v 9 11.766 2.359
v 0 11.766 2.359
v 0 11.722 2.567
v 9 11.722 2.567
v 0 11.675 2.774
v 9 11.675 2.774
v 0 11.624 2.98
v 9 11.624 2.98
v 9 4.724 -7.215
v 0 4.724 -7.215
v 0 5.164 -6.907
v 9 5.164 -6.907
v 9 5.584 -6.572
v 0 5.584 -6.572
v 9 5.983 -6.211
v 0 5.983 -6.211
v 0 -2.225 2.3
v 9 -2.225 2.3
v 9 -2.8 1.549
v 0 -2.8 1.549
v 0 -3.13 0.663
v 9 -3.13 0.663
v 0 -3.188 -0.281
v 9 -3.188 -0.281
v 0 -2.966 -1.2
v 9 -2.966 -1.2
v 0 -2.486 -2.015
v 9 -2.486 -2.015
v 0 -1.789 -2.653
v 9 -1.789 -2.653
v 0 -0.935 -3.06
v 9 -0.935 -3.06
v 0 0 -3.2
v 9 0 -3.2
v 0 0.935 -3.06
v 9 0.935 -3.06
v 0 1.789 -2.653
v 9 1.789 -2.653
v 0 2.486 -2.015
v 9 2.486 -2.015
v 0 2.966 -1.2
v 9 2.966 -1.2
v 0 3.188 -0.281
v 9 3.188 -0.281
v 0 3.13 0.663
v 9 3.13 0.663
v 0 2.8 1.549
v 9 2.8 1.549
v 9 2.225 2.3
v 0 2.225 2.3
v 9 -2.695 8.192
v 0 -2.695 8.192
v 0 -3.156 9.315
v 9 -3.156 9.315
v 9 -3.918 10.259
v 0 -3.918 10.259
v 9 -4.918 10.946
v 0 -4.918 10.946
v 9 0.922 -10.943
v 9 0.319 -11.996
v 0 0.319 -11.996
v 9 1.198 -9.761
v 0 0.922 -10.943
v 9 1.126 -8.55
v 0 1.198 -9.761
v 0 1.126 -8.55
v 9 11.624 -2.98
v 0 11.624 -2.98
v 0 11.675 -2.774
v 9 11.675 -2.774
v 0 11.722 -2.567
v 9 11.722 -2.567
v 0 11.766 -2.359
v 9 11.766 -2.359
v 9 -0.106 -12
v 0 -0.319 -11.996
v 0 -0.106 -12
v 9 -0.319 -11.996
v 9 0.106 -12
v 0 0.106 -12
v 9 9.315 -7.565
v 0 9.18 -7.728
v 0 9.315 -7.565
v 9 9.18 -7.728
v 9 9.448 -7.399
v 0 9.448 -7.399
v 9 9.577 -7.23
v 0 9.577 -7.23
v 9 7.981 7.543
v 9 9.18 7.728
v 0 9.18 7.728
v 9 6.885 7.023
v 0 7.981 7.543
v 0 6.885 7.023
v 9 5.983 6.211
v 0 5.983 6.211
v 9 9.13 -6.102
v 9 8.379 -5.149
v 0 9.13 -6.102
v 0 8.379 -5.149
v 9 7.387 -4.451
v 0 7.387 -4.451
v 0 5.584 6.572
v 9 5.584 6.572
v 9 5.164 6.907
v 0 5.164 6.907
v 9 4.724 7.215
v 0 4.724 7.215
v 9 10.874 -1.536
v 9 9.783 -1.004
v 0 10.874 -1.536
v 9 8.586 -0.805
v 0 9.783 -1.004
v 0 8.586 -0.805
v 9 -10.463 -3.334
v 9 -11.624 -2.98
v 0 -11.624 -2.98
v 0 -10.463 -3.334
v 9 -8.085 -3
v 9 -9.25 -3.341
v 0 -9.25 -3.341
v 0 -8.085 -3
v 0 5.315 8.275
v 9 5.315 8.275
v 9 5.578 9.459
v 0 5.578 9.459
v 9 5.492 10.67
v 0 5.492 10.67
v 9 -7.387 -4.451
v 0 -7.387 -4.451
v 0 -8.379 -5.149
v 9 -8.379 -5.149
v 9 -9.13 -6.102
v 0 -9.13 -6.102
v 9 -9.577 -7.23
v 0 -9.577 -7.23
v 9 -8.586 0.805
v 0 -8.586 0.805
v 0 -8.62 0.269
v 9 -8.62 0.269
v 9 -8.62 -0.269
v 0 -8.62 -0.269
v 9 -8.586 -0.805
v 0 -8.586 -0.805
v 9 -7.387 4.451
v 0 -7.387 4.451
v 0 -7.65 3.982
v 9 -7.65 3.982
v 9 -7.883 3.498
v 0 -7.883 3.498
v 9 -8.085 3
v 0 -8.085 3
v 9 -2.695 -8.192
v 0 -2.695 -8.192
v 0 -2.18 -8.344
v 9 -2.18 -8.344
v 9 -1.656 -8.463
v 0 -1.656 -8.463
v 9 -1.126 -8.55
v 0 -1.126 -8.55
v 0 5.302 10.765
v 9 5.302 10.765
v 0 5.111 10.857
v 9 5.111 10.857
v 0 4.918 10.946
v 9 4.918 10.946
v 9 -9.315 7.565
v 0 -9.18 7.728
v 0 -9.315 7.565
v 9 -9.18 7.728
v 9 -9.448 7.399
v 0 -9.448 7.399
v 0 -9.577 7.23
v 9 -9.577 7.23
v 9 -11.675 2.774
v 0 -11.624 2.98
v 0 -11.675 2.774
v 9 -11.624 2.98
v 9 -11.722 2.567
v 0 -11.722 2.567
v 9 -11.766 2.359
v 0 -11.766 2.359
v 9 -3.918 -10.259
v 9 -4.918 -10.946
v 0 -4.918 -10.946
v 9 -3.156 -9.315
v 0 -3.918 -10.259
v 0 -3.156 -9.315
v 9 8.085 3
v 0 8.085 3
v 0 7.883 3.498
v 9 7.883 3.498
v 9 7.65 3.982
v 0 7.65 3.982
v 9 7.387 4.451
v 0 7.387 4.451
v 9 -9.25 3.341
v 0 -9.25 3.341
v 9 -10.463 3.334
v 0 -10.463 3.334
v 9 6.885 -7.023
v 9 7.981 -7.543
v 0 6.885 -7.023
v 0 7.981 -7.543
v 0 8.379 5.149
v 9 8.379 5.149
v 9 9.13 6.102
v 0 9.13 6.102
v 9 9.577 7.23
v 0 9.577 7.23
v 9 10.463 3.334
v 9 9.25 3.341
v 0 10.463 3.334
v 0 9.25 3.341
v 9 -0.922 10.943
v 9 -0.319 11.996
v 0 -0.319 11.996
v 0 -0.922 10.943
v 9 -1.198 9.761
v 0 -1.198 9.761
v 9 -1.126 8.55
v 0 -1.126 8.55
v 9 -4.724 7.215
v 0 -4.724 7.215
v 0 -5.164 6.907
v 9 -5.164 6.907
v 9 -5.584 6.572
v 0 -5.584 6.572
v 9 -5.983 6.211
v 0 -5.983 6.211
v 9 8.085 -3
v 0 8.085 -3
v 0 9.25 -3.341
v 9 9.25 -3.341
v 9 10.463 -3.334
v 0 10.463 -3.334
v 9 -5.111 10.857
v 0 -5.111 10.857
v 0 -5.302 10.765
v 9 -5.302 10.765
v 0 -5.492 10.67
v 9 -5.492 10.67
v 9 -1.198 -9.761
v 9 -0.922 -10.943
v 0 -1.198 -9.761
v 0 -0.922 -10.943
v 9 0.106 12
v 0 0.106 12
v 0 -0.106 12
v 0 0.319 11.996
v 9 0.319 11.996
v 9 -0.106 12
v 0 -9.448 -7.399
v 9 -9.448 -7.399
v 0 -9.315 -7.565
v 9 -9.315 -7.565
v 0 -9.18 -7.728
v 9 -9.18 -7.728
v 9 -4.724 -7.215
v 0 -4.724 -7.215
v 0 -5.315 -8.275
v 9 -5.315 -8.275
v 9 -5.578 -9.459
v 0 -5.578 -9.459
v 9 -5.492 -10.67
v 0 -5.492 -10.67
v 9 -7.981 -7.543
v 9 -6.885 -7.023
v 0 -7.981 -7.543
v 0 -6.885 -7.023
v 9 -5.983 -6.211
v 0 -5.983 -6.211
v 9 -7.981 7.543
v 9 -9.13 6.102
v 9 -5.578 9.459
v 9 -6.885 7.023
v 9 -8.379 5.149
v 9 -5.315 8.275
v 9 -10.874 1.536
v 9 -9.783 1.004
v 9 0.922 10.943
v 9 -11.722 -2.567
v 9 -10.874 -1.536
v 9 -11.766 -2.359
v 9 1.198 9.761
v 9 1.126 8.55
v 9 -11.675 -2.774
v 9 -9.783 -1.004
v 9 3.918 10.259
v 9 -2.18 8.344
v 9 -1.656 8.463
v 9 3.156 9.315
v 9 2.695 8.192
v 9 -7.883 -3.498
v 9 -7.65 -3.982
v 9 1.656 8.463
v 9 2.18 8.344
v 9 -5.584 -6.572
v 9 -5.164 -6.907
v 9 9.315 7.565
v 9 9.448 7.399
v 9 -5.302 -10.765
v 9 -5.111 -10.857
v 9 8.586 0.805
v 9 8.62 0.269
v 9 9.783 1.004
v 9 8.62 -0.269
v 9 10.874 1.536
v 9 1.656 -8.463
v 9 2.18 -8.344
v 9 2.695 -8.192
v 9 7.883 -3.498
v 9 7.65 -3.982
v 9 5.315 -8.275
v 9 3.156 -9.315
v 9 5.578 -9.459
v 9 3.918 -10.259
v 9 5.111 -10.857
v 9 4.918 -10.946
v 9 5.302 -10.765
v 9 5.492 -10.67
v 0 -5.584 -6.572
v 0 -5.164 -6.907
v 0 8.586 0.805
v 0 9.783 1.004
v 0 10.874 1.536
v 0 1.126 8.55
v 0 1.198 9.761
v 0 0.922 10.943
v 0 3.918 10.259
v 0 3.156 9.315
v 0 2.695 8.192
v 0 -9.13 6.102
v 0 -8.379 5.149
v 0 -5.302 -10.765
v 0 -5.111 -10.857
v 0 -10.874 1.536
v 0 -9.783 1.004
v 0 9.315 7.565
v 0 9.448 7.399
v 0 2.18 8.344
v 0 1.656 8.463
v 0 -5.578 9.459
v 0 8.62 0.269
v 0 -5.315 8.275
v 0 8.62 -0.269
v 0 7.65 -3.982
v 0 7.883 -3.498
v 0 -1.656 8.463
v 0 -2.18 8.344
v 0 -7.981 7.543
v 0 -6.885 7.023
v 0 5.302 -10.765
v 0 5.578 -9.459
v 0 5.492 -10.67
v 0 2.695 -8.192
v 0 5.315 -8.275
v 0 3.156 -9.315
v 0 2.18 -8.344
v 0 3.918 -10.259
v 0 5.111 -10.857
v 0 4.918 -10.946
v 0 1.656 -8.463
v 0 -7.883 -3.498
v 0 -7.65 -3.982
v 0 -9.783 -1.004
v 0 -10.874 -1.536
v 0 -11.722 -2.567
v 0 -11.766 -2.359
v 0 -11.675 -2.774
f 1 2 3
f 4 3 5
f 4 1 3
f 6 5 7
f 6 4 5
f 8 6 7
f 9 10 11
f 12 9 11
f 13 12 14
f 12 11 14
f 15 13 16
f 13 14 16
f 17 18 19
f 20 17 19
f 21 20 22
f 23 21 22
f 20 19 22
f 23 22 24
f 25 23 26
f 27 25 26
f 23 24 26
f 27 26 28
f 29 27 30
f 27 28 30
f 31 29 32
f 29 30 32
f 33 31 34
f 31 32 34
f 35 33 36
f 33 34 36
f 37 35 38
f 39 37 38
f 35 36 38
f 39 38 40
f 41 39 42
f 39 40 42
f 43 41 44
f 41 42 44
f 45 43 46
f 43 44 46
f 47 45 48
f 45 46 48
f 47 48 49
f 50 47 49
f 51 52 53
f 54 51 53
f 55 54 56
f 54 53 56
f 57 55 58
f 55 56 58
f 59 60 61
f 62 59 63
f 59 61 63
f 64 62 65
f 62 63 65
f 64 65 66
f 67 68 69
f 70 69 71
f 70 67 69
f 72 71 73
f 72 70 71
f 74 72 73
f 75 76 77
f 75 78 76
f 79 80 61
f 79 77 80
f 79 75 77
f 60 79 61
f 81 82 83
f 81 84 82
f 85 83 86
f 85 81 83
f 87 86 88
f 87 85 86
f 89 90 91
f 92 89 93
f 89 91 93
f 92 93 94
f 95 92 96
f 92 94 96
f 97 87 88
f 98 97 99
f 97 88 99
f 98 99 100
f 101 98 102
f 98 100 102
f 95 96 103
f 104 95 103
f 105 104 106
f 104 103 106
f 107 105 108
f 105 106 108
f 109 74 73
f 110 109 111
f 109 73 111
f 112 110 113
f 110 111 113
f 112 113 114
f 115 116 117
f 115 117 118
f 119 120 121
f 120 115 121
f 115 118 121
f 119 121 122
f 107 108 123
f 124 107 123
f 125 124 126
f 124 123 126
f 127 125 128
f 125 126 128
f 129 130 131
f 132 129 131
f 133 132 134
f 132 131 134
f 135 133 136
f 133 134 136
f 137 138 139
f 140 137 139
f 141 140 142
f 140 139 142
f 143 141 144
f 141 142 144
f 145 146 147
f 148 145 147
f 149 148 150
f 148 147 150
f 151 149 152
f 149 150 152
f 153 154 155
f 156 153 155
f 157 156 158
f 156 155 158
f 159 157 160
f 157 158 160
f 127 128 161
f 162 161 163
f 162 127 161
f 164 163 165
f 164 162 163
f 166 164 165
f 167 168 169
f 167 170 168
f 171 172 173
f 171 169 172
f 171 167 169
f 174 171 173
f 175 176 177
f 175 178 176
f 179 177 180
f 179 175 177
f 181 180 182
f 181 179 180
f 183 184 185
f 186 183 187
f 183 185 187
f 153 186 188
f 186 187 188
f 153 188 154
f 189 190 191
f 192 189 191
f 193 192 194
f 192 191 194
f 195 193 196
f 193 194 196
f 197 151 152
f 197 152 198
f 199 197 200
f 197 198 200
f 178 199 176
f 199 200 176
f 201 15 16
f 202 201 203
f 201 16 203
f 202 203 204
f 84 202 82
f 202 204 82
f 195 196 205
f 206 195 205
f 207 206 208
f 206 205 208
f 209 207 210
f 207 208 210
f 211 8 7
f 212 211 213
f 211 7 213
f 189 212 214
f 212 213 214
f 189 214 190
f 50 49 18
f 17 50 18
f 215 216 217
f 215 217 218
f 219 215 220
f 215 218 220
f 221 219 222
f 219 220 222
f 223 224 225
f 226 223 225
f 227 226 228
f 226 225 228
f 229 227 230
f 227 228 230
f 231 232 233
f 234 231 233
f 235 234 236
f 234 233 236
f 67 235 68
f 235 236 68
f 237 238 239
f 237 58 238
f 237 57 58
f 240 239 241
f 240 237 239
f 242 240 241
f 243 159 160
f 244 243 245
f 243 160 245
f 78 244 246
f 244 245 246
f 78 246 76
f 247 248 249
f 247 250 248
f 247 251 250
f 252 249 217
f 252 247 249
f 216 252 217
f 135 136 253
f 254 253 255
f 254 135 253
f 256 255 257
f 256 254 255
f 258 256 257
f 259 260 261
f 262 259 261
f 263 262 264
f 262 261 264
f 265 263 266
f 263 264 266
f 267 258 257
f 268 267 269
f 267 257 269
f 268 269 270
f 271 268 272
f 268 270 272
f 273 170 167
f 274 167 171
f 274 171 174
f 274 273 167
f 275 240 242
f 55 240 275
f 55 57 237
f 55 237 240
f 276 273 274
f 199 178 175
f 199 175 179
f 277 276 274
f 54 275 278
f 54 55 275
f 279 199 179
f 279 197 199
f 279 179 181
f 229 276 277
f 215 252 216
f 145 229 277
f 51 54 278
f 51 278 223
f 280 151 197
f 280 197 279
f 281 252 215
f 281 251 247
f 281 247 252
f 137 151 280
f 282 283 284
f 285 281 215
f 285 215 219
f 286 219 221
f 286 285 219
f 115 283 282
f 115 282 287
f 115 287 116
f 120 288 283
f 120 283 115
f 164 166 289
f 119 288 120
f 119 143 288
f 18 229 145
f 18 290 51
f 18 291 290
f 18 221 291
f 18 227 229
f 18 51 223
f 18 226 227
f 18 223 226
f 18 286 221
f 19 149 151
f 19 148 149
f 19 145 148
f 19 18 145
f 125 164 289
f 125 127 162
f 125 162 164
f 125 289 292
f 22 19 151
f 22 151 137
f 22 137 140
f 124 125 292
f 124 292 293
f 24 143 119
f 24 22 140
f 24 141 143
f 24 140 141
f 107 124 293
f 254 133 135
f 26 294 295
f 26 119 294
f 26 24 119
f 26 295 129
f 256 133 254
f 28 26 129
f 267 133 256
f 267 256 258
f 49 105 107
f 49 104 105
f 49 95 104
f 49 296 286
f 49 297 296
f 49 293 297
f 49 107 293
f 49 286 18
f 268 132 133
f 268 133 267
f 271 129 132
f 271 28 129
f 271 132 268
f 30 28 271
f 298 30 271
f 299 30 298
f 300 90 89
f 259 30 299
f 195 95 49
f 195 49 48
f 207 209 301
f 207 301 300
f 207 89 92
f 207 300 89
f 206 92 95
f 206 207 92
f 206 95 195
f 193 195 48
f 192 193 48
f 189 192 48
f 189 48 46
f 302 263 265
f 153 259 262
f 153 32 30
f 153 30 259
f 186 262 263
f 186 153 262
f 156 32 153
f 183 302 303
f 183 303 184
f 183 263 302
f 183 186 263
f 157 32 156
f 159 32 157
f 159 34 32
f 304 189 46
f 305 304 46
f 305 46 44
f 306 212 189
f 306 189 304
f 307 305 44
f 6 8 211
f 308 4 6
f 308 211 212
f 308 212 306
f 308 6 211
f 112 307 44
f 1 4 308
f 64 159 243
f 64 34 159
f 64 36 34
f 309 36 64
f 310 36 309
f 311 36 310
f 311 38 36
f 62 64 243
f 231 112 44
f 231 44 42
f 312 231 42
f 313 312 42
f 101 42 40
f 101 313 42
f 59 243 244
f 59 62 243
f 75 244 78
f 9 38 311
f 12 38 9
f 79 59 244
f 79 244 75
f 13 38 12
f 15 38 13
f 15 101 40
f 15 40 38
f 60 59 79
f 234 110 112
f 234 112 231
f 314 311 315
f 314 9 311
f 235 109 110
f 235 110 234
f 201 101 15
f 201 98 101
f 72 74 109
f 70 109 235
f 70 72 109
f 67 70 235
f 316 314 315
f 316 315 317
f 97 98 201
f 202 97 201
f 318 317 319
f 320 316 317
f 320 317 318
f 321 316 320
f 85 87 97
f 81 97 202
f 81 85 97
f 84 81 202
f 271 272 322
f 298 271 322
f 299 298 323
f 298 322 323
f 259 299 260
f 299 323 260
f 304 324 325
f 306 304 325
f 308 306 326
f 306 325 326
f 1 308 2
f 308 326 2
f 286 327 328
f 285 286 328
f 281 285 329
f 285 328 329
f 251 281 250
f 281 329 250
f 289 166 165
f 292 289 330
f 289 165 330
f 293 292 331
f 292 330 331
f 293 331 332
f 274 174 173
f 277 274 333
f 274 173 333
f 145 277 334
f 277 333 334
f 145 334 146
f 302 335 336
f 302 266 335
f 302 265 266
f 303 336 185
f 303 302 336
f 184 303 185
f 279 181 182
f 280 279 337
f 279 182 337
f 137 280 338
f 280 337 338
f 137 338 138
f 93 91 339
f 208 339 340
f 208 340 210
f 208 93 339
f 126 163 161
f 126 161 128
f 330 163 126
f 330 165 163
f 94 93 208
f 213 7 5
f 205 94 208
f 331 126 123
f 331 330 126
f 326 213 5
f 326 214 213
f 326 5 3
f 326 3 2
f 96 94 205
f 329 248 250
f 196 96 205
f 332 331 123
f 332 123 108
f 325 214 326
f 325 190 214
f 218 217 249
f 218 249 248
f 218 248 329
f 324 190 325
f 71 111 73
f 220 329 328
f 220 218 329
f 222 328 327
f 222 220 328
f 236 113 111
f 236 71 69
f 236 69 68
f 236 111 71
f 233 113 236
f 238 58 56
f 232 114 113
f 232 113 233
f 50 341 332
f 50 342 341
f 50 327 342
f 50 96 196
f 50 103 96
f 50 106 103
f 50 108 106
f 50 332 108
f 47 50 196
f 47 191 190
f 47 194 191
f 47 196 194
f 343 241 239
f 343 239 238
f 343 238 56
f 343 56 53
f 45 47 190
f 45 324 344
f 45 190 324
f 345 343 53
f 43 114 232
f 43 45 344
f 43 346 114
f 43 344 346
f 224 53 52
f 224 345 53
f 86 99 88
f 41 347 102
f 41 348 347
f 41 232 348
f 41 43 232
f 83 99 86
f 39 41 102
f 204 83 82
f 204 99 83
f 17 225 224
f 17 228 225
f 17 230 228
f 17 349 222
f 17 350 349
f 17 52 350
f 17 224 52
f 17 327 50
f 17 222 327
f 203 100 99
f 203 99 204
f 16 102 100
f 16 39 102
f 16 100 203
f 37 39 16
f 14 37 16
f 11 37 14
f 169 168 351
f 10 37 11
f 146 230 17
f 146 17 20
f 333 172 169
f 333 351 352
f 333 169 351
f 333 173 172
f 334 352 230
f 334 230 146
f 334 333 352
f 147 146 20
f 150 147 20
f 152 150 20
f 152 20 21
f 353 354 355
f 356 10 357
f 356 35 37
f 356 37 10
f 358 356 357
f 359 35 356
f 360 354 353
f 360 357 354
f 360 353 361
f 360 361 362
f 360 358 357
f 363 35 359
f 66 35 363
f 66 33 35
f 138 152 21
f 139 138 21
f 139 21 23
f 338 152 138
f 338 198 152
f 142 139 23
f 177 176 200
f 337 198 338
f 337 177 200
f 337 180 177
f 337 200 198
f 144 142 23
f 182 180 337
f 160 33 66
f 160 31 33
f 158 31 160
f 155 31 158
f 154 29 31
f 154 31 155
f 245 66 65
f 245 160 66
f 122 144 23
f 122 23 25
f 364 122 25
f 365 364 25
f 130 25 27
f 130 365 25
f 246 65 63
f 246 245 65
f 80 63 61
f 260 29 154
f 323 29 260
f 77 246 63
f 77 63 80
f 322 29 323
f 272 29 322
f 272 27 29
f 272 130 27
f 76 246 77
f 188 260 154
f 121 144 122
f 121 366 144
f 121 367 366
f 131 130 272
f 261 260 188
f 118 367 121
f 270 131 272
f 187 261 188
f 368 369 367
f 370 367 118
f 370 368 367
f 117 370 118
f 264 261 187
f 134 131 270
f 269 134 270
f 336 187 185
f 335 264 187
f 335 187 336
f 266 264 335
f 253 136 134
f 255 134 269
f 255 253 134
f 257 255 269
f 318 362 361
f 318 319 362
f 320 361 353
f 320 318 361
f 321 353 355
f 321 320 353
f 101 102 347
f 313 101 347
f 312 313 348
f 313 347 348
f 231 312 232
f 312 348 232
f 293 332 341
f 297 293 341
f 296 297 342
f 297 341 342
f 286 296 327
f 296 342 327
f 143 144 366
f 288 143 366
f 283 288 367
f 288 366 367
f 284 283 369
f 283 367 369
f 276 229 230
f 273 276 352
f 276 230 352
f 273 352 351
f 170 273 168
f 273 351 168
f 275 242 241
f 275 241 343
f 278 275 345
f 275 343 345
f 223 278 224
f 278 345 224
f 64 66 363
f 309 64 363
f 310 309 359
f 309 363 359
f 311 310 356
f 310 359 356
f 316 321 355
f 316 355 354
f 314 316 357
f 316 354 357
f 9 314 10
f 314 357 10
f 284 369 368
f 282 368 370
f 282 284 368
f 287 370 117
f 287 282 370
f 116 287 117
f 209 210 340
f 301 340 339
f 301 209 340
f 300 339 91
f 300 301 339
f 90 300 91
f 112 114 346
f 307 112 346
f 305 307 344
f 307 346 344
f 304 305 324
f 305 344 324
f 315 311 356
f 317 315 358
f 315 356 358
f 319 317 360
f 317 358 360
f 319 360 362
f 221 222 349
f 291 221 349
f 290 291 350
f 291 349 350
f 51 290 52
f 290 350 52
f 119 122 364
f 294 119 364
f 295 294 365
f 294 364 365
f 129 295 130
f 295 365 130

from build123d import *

# Parameters (mm, degrees)
BASPROSKE_W         = 14
BASPROSKE_H         = 12
TOOTHCUT_DEPTH      = 23
TEETHCUTS_COUNT     = 14
TEETHCUTS_ANGLE     = 334.285714286
BORSKE_R            = 3
BORE_DEPTH          = 50.0000508
SKETCH2_R           = 16.086266861
CUT_EXTRUDE1_DEPTH  = 5
SKETCH3_R           = 3.2
CUT_EXTRUDE2_DEPTH  = 20.064015522
BOSS_EXTRUDE1_DEPTH = 9


with BuildPart() as part:
    # BasProSke → Base-Revolve (revolve)
    with BuildSketch(Plane(origin=(0, 0, 0), x_dir=(1, 0, 0), z_dir=(0, 1, 0)), mode=Mode.PRIVATE) as base_revolve_sk:
        with Locations((7, 6)):
            Rectangle(BASPROSKE_W, BASPROSKE_H)
    revolve(base_revolve_sk.sketch.rotate(Axis((-10, 0, 0), (1, 0, 0)), 180), axis=Axis((-10, 0, 0), (1, 0, 0)))

    # TooCutSke → ToothCut (cut, through all)
    with BuildSketch(Plane(origin=(0, 0, 0), x_dir=(0, 0, -1), z_dir=(1, 0, 0))):
        with BuildLine():
            ThreePointArc((0.804845511, 8.586361261), (0, 8.624), (-0.804845511, 8.586361261))
            ThreePointArc((-0.804845511, 8.586361261), (-1.237812142, 10.362618414), (-2.384428228, 11.78663426))
            ThreePointArc((-2.384428228, 11.78663426), (0, 12.0254), (2.384428228, 11.78663426))
            ThreePointArc((2.384428228, 11.78663426), (1.237812142, 10.362618414), (0.804845511, 8.586361261))
        make_face()
    toothcut = extrude(amount=TOOTHCUT_DEPTH, mode=Mode.SUBTRACT)

    # TeethCuts: ToothCut ×14 about axis
    teethcuts_axis = Axis((-10, 0, 0), (1, 0, 0))
    for i in range(1, TEETHCUTS_COUNT):
        add(toothcut.rotate(teethcuts_axis, i * TEETHCUTS_ANGLE / (TEETHCUTS_COUNT - 1)), mode=Mode.SUBTRACT)

    # BorSke → Bore (cut, symmetric)
    with BuildSketch(Plane(origin=(0, 0, 0), x_dir=(0, 0, -1), z_dir=(1, 0, 0))):
        with Locations(Location((0, 0, 0), (0, 0, 180))):
            Circle(BORSKE_R)
    extrude(amount=BORE_DEPTH, both=True, mode=Mode.SUBTRACT)

    # Sketch2 → Cut-Extrude1 (cut)
    with BuildSketch(Plane(origin=(14, 0, 0), x_dir=(0, 0, -1), z_dir=(1, 0, 0))):
        Circle(SKETCH2_R)
    extrude(amount=-CUT_EXTRUDE1_DEPTH, mode=Mode.SUBTRACT)

    # Sketch3 → Cut-Extrude2 (cut, through all)
    with BuildSketch(Plane(origin=(9, 0, 0), x_dir=(0, 0, -1), z_dir=(1, 0, 0))):
        Circle(SKETCH3_R)
    extrude(amount=-CUT_EXTRUDE2_DEPTH, mode=Mode.SUBTRACT)

    # Sketch4 → Boss-Extrude1 (add)
    with BuildSketch(Plane(origin=(9, 0, 0), x_dir=(0, 0, -1), z_dir=(1, 0, 0))):
        with BuildLine():
            Line((-2.3, 2.224859546), (-2.3, -2.224859546))
            ThreePointArc((-2.3, -2.224859546), (-3.2, 0), (-2.3, 2.224859546))
        make_face()
    extrude(amount=-BOSS_EXTRUDE1_DEPTH)


solid = part.part
